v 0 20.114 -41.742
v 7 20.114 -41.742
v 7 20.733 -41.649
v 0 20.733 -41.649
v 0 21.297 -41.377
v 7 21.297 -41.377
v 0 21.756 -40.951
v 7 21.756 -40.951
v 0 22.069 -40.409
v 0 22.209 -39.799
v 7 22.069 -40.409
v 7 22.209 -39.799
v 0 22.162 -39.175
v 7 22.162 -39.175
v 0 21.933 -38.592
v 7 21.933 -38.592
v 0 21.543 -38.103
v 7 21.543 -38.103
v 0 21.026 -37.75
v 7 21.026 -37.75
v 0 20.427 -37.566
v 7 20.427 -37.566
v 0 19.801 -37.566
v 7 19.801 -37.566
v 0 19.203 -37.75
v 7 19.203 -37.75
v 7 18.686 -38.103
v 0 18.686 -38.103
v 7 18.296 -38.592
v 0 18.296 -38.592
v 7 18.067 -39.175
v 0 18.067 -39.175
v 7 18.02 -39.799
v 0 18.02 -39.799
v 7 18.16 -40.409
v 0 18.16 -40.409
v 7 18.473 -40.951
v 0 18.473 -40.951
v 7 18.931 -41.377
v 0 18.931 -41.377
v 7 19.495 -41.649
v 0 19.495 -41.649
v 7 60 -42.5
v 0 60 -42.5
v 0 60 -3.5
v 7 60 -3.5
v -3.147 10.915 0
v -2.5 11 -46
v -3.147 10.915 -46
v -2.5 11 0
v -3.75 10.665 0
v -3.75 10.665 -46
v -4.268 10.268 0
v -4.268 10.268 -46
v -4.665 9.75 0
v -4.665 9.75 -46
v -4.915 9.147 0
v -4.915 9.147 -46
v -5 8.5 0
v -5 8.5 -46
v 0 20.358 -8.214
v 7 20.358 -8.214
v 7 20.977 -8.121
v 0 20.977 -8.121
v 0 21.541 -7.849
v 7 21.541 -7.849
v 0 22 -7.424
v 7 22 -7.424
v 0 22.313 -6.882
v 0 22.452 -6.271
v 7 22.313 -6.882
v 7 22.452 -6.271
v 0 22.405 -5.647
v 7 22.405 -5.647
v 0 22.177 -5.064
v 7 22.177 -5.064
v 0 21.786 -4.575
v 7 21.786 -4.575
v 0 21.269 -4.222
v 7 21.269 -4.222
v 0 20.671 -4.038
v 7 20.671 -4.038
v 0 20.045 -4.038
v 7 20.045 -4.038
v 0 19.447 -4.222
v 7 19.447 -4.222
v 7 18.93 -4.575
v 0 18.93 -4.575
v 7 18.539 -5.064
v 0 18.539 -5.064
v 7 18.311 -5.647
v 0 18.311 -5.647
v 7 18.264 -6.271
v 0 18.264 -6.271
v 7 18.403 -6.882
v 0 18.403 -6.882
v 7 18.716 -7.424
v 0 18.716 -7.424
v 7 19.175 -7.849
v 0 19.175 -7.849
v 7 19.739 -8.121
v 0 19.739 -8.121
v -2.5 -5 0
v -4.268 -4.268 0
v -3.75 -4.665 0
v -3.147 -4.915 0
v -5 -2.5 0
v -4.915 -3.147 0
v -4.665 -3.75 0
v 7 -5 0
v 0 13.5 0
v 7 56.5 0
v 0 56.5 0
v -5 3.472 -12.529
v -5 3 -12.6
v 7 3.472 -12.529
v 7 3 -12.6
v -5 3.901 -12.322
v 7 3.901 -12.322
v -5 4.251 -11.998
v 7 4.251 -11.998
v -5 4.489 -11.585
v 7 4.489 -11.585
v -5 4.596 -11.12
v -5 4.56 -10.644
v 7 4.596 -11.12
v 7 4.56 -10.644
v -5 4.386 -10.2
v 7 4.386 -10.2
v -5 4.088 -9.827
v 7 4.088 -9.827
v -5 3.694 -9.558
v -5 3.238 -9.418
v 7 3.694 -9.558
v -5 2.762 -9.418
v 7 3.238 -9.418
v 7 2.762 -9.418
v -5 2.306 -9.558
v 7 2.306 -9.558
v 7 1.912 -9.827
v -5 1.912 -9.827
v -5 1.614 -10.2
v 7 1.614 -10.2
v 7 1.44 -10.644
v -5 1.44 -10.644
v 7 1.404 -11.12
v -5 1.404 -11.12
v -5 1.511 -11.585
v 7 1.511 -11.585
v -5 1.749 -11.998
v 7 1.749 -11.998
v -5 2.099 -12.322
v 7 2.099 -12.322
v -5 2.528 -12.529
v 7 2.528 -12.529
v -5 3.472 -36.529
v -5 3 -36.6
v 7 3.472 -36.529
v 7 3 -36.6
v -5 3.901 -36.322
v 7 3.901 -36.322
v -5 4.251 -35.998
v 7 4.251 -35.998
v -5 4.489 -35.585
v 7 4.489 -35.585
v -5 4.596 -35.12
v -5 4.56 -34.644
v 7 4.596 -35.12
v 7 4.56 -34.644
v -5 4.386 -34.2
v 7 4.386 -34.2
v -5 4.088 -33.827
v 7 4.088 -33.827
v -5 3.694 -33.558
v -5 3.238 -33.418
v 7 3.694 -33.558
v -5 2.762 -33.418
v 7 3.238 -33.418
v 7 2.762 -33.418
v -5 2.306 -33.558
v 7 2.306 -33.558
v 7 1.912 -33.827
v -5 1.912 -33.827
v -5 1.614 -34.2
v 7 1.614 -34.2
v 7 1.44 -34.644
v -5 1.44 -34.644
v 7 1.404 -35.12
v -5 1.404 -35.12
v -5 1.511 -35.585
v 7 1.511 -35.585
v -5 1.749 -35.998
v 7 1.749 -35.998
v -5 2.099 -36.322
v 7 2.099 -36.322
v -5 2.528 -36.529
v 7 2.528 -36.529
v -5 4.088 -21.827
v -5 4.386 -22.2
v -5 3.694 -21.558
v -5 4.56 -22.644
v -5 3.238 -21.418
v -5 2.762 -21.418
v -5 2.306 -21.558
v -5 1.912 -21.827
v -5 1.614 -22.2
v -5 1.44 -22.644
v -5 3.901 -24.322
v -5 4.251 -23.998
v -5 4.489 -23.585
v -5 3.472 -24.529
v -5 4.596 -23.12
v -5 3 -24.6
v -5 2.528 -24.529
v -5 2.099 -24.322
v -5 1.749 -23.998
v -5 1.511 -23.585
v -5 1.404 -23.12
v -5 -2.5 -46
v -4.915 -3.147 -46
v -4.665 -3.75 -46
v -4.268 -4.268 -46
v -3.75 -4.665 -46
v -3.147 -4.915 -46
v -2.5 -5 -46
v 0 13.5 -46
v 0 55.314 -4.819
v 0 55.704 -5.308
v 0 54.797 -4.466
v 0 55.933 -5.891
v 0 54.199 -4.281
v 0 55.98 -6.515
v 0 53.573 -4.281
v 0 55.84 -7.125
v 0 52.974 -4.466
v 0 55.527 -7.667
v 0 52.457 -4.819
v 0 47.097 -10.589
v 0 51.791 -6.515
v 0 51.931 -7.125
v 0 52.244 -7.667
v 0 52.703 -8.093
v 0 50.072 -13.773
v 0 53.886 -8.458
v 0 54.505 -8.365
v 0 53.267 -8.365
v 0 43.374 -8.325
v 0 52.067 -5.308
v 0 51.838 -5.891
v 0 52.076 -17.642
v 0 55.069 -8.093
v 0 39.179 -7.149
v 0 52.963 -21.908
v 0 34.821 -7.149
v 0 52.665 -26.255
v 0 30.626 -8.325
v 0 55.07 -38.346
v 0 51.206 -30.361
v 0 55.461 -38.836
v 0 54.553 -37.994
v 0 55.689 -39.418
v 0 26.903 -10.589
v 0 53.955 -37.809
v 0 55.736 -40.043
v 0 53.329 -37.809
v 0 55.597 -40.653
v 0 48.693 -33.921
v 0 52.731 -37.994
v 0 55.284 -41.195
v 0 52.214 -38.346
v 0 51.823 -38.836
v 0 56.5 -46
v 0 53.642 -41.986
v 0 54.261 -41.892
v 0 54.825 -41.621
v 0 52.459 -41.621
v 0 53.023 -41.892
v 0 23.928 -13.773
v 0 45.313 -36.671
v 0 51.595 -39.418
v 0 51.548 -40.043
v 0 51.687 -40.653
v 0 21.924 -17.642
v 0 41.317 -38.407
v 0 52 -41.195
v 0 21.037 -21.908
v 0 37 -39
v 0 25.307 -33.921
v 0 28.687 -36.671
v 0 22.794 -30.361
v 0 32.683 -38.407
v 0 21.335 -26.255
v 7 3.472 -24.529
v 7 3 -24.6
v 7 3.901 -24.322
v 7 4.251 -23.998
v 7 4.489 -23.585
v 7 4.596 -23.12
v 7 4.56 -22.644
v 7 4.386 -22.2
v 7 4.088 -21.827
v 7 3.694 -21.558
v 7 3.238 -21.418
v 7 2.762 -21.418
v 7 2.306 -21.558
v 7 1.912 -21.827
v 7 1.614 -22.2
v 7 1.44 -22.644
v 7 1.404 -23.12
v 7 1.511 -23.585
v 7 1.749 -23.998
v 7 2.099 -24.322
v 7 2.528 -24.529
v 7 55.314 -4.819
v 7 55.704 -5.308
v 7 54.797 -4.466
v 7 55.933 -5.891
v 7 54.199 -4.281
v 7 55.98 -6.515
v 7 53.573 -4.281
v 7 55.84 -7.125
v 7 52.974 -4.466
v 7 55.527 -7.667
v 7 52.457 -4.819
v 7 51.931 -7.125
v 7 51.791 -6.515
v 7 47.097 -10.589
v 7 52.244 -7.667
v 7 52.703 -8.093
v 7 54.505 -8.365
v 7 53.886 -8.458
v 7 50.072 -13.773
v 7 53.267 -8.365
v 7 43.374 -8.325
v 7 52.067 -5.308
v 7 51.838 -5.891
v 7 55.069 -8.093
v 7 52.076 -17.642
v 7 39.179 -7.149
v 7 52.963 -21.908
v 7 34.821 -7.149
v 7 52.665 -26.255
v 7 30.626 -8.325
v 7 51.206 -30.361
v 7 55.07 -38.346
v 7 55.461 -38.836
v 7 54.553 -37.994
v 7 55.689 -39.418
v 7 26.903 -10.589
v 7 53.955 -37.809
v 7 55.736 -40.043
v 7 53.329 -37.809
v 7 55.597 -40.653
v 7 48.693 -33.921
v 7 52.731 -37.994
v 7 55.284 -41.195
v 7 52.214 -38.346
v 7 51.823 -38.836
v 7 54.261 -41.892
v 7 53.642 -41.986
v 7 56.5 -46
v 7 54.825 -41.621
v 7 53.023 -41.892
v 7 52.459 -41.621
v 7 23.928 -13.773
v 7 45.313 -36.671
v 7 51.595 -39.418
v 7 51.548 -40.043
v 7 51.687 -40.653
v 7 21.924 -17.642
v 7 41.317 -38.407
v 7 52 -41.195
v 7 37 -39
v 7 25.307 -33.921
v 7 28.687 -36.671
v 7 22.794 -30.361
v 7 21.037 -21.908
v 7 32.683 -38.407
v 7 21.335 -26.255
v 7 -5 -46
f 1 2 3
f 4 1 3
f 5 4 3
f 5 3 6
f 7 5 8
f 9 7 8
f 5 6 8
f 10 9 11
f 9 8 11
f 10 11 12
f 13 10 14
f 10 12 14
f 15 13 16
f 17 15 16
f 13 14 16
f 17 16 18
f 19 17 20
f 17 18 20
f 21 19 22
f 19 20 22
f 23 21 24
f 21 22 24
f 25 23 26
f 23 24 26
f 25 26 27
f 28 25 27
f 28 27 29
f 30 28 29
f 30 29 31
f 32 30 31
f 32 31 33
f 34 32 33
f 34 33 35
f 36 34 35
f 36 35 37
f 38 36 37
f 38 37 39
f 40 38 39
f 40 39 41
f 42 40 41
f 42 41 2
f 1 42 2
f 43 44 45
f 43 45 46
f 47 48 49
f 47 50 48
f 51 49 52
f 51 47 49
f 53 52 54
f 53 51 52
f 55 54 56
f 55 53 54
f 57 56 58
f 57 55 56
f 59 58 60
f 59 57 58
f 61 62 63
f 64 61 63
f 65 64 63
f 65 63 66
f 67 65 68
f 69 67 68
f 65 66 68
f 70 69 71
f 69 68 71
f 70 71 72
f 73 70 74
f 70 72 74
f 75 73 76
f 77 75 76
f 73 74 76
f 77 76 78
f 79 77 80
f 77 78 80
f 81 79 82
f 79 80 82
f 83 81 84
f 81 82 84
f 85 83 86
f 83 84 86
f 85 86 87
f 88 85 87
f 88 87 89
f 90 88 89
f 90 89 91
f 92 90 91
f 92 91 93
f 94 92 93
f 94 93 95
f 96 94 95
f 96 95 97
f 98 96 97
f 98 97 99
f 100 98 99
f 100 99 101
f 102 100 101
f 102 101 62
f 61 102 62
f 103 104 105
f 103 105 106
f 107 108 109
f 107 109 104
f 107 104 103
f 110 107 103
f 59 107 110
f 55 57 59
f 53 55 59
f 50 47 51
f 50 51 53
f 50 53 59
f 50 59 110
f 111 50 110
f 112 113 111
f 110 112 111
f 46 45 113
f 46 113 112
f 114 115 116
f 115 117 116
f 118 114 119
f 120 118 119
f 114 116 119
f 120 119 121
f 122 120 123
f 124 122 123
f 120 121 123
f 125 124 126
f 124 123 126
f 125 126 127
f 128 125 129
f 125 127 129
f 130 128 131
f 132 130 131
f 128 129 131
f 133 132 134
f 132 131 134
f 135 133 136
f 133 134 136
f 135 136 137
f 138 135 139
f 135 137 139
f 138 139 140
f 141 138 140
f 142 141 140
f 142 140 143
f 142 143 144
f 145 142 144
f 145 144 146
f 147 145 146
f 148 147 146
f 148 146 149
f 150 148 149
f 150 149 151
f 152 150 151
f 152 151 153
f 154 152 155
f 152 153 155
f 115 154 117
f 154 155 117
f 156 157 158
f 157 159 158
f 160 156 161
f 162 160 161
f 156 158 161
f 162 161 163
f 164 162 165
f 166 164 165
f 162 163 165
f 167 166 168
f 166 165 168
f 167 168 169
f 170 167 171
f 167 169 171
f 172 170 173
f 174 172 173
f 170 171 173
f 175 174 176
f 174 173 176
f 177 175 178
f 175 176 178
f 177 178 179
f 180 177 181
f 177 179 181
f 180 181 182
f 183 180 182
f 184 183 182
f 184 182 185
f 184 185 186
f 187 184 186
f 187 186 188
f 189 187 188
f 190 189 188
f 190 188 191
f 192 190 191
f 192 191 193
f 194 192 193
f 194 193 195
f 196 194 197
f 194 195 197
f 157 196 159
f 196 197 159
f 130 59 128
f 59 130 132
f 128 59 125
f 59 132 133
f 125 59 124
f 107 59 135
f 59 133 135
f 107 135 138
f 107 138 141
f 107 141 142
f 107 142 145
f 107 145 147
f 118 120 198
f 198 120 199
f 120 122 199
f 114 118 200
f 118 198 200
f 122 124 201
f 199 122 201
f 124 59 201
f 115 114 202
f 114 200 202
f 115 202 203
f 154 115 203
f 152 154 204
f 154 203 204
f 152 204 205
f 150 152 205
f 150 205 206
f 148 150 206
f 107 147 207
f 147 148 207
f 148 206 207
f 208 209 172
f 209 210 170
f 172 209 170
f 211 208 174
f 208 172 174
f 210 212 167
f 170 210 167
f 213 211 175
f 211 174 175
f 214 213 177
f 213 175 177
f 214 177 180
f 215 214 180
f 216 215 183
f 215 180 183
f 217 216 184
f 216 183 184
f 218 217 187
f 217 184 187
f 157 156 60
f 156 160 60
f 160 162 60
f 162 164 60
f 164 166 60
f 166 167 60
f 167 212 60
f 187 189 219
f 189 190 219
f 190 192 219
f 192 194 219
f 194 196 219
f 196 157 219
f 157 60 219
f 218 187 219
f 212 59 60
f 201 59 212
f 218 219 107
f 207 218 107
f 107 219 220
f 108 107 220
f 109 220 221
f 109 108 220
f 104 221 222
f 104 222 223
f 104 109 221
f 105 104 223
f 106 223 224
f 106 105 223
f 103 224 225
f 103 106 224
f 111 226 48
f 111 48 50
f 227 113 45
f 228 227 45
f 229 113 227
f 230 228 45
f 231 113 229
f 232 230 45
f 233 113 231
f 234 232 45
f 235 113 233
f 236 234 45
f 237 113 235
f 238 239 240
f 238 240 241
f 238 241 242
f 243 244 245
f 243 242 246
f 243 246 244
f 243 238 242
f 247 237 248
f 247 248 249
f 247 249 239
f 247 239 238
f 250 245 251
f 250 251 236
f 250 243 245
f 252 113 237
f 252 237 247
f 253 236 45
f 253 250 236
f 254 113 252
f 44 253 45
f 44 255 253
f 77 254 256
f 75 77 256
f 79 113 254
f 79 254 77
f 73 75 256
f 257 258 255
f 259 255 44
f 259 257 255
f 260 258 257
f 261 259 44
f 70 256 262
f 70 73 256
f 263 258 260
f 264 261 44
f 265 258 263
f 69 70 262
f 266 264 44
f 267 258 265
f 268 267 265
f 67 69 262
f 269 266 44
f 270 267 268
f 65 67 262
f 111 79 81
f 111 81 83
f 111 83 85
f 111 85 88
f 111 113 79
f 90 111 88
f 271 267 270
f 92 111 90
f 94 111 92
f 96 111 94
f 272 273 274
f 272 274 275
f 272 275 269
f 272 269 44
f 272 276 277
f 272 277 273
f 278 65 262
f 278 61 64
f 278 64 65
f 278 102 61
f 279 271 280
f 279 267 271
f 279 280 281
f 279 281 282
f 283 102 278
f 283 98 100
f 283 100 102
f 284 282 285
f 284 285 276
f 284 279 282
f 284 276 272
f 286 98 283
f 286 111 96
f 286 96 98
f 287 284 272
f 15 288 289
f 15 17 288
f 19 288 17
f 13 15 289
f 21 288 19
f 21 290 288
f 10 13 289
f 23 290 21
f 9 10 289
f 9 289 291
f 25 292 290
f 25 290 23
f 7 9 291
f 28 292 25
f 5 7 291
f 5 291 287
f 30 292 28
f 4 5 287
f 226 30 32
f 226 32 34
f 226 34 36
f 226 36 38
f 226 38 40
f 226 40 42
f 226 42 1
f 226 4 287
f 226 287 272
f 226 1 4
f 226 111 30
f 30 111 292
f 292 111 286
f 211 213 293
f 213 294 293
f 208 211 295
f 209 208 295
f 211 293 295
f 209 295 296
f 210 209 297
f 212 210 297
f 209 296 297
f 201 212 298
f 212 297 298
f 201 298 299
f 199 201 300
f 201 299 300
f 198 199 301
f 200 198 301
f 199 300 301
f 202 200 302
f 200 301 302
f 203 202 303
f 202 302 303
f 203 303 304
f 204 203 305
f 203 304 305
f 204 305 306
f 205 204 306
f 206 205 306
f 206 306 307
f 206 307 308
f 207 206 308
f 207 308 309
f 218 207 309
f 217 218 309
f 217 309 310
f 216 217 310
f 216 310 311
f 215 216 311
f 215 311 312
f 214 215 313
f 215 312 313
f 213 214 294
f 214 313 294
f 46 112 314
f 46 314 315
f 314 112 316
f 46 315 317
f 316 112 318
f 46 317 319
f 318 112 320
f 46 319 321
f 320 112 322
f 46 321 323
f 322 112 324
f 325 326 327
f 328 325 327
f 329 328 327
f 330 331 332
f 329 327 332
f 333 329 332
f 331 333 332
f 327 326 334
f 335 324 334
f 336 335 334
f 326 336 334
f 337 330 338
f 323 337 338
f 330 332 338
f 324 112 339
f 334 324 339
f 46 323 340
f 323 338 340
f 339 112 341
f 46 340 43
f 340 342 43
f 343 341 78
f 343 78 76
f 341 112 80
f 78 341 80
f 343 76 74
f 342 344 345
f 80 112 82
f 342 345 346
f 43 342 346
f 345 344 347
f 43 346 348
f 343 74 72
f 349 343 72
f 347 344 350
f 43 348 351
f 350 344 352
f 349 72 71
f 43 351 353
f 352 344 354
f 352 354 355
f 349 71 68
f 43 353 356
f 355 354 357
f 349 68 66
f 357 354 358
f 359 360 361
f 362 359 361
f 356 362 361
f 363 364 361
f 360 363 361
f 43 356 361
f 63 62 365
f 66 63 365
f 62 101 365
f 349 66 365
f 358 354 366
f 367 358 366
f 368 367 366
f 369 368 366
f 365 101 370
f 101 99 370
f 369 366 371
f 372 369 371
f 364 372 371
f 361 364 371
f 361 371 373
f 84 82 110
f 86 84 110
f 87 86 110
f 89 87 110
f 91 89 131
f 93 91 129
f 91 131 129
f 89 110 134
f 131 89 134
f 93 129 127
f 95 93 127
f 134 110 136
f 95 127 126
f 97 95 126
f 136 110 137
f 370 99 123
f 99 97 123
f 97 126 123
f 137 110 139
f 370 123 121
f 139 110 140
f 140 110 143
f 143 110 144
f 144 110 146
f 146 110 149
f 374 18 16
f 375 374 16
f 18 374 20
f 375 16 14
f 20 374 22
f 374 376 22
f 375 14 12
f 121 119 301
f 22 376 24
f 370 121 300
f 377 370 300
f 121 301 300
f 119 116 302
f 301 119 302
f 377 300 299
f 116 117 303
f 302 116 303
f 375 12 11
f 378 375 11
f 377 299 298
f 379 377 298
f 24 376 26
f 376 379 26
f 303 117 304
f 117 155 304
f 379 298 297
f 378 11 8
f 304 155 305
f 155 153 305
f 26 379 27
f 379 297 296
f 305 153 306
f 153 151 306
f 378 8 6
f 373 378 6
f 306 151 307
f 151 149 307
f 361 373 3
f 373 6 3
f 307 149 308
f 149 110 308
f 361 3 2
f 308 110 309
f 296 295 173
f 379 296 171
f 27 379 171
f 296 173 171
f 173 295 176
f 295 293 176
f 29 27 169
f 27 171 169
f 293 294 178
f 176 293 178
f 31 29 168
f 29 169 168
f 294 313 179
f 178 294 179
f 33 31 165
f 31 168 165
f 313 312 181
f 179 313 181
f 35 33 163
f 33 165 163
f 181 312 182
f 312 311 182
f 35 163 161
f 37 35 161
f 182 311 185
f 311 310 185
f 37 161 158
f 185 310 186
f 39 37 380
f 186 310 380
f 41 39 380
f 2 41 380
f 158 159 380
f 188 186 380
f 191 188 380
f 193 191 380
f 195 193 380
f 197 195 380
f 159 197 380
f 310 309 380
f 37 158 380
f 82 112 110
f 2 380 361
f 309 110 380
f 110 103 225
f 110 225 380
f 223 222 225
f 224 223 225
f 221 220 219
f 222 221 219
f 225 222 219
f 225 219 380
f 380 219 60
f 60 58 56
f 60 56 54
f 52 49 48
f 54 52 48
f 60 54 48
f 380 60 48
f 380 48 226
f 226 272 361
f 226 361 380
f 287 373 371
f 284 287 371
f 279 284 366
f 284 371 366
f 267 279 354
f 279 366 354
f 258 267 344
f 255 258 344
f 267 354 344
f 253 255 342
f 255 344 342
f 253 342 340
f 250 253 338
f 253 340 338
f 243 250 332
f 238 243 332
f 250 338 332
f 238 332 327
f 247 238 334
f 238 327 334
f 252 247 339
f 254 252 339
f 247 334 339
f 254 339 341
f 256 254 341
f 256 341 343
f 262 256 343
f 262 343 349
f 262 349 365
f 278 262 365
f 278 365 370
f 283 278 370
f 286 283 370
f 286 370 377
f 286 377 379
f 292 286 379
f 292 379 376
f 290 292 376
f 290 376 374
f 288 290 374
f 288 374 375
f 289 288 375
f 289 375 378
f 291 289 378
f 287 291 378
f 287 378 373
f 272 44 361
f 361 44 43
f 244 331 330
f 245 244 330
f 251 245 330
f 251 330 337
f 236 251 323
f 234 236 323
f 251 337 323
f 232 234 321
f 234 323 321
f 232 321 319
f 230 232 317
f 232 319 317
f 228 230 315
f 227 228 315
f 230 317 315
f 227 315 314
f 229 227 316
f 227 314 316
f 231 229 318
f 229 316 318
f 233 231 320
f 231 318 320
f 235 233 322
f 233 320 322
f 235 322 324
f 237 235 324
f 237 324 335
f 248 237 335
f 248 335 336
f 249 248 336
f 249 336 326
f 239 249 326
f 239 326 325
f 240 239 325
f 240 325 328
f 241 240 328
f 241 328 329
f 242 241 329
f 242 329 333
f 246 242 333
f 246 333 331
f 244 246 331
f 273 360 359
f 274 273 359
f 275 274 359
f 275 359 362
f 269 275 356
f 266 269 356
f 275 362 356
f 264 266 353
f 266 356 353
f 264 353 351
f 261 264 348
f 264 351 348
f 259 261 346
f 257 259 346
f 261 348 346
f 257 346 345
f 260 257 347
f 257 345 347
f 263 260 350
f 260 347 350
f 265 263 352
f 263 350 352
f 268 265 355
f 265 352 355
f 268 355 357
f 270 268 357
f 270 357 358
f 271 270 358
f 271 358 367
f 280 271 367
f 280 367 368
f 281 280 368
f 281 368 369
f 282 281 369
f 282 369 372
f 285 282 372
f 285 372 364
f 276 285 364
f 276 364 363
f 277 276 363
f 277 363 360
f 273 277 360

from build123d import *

# Parameters (mm, degrees)
SKETCH1_W                                           = 92.56
SKETCH1_H                                           = 46
BOSS_EXTRUDE1_DEPTH                                 = 6
SKETCH2_W                                           = 7
SKETCH2_H                                           = 46
BOSS_EXTRUDE2_DEPTH                                 = 54
SKETCH3_R                                           = 16
CUT_EXTRUDE1_DEPTH                                  = 120.512985069
SKETCH4_R                                           = 16
CUT_EXTRUDE2_DEPTH                                  = 117.616266447
F_4_2_4_2_DIAMETER_HOLE1_D                          = 4.2
F_4_2_4_2_DIAMETER_HOLE2_D                          = 4.2
CHAMFER1_SIZE                                       = 3.5
CHAMFER2_SIZE                                       = 6
BOSS_EXTRUDE3_DEPTH                                 = 46
FILLET1_R                                           = 2.5
CHAMFER3_SIZE                                       = 2.5
FILLET2_R                                           = 2.5
M3_CLEARANCE_HOLE1_D                                = 3.2
M3_CLEARANCE_HOLE1_DEPTH                            = 30
M3_CLEARANCE_HOLE1_TIP                              = 0.96137699
CSK_FOR_M3_COUNTERSUNK_FLAT_HEAD_SCREW2_D           = 3.6
CSK_FOR_M3_COUNTERSUNK_FLAT_HEAD_SCREW2_DEPTH       = 30
CSK_FOR_M3_COUNTERSUNK_FLAT_HEAD_SCREW2_CSINK_D     = 6.3
CSK_FOR_M3_COUNTERSUNK_FLAT_HEAD_SCREW2_CSINK_ANGLE = 90
CSK_FOR_M3_COUNTERSUNK_FLAT_HEAD_SCREW2_TIP         = 1.081549114
SKETCH18_W                                          = 2.5
SKETCH18_H                                          = 5.65
CUT_EXTRUDE4_DEPTH                                  = 121.623188484


with BuildPart() as part:
    # Sketch1 → Boss-Extrude1 (new body)
    with BuildSketch(Plane(origin=(0, 0, 0), x_dir=(1, 0, 0), z_dir=(0, 1, 0))):
        with Locations((46.28, 23)):
            Rectangle(SKETCH1_W, SKETCH1_H)
    extrude(amount=BOSS_EXTRUDE1_DEPTH)

    # Sketch2 → Boss-Extrude2 (add)
    with BuildSketch(Plane(origin=(0, 6, 0), x_dir=(1, 0, 0), z_dir=(0, 1, 0))):
        with Locations((89.06, 23)):
            Rectangle(SKETCH2_W, SKETCH2_H)
        with Locations((3.5, 23)):
            Rectangle(SKETCH2_W, SKETCH2_H)
    extrude(amount=BOSS_EXTRUDE2_DEPTH)

    # Sketch3 → Cut-Extrude1 (cut, through all)
    with BuildSketch(Plane(origin=(92.56, 0, 0), x_dir=(0, 0, -1), z_dir=(1, 0, 0))):
        with Locations((23, 37)):
            Circle(SKETCH3_R)
    extrude(amount=-CUT_EXTRUDE1_DEPTH, mode=Mode.SUBTRACT)

    # Sketch4 → Cut-Extrude2 (cut, through all)
    with BuildSketch(Plane(origin=(0, 6, 0), x_dir=(1, 0, 0), z_dir=(0, 1, 0))):
        with Locations(Location((46.28, 23, 0), (0, 0, 270))):
            Circle(SKETCH4_R)
    extrude(amount=-CUT_EXTRUDE2_DEPTH, mode=Mode.SUBTRACT)

    # Ø4.2 (4.2) Diameter Hole1 (through all)
    with Locations(Plane(origin=(0, 0, 0), x_dir=(-1, 0, 0), z_dir=(0, -1, 0))):
        with Locations((-63.165621688, 39.642079068), (-29.637920932, 39.885621688), (-29.394378312, 6.357920932), (-62.922079068, 6.114378312)):
            Hole(F_4_2_4_2_DIAMETER_HOLE1_D / 2)

    # Ø4.2 (4.2) Diameter Hole2 (through all)
    with Locations(Plane.ZY):
        with Locations((-39.885621688, 53.642079068), (-6.357920932, 53.885621688), (-6.114378312, 20.357920932), (-39.642079068, 20.114378312)):
            Hole(F_4_2_4_2_DIAMETER_HOLE2_D / 2)

    # Chamfer1
    chamfer1_edges = [part.edges().sort_by_distance(p)[0] for p in [
        (89.06, 60, -46),
        (89.06, 60, 0),
        (3.5, 60, 0),
        (3.5, 60, -46),
    ]]
    chamfer(chamfer1_edges, length=CHAMFER1_SIZE)

    # Chamfer2
    chamfer2_edges = [part.edges().sort_by_distance(p)[0] for p in [
        (85.56, 6, -23),
        (7, 6, -23),
    ]]
    chamfer(chamfer2_edges, length=CHAMFER2_SIZE)

    # Sketch10 → Boss-Extrude3 (add)
    with BuildSketch(Plane(origin=(0, 0, -46), x_dir=(-1, 0, 0), z_dir=(0, 0, -1))):
        Polygon((0, 11), (5, 11), (5, -5), (-11, -5), (-11, 0), (0, 0), align=None)
        Polygon((-81.56, 0), (-92.56, 0), (-92.56, 11), (-97.56, 11), (-97.56, -5), (-81.56, -5), align=None)
    extrude(amount=-BOSS_EXTRUDE3_DEPTH)

    # Fillet1
    fillet1_edges = [part.edges().sort_by_distance(p)[0] for p in [
        (-5, 11, -23),
        (11, -5, -23),
        (81.56, -5, -23),
        (97.56, 11, -23),
    ]]
    fillet(fillet1_edges, radius=FILLET1_R)

    # Chamfer3
    chamfer3_edges = [part.edges().sort_by_distance(p)[0] for p in [
        (92.56, 11, -23),
        (81.56, 0, -23),
        (11, 0, -23),
        (0, 11, -23),
    ]]
    chamfer(chamfer3_edges, length=CHAMFER3_SIZE - 0.0001)  # a hair under: the kernel refuses the full size

    # Fillet2
    fillet2_edges = [part.edges().sort_by_distance(p)[0] for p in [
        (-5, -5, -23),
        (97.56, -5, -23),
    ]]
    fillet(fillet2_edges, radius=FILLET2_R)

    # M3 Clearance Hole1
    with Locations(Plane.ZY.offset(5)):
        with Locations((-11, 3), (-23, 3), (-35, 3)):
            Hole(M3_CLEARANCE_HOLE1_D / 2, depth=M3_CLEARANCE_HOLE1_DEPTH)
            with Locations((0, 0, -(M3_CLEARANCE_HOLE1_DEPTH + M3_CLEARANCE_HOLE1_TIP / 2))):  # 118° drill point
                Cone(0, M3_CLEARANCE_HOLE1_D / 2, M3_CLEARANCE_HOLE1_TIP, mode=Mode.SUBTRACT)

    # CSK for M3 Countersunk Flat Head Screw2
    with Locations(Plane(origin=(97.56, 0, 0), x_dir=(0, 0, -1), z_dir=(1, 0, 0))):
        with Locations((11, 3), (23, 3), (35, 3)):
            CounterSinkHole(CSK_FOR_M3_COUNTERSUNK_FLAT_HEAD_SCREW2_D / 2, CSK_FOR_M3_COUNTERSUNK_FLAT_HEAD_SCREW2_CSINK_D / 2, depth=CSK_FOR_M3_COUNTERSUNK_FLAT_HEAD_SCREW2_DEPTH, counter_sink_angle=CSK_FOR_M3_COUNTERSUNK_FLAT_HEAD_SCREW2_CSINK_ANGLE)
            with Locations((0, 0, -(CSK_FOR_M3_COUNTERSUNK_FLAT_HEAD_SCREW2_DEPTH + CSK_FOR_M3_COUNTERSUNK_FLAT_HEAD_SCREW2_TIP / 2))):  # 118° drill point
                Cone(0, CSK_FOR_M3_COUNTERSUNK_FLAT_HEAD_SCREW2_D / 2, CSK_FOR_M3_COUNTERSUNK_FLAT_HEAD_SCREW2_TIP, mode=Mode.SUBTRACT)

    # Sketch18 → Cut-Extrude4 (cut, through all)
    with BuildSketch(Plane(origin=(0, 6, 0), x_dir=(1, 0, 0), z_dir=(0, 1, 0))):
        with Locations((22, 23)):
            Rectangle(SKETCH18_W, SKETCH18_H)
        with Locations((22, 35)):
            Rectangle(SKETCH18_W, SKETCH18_H)
        with Locations((22, 11)):
            Rectangle(SKETCH18_W, SKETCH18_H)
    cut_extrude4 = extrude(amount=-CUT_EXTRUDE4_DEPTH, mode=Mode.SUBTRACT)

    # Mirror1: Cut-Extrude4 across plane
    add(cut_extrude4.mirror(Plane.ZY.offset(-46.28)), mode=Mode.SUBTRACT)

    # SurfaceCut3
    split(bisect_by=Plane(origin=(7, 0, 0), x_dir=(0, 0, -1), z_dir=(1, 0, 0)), keep=Keep.BOTTOM)


solid = part.part
